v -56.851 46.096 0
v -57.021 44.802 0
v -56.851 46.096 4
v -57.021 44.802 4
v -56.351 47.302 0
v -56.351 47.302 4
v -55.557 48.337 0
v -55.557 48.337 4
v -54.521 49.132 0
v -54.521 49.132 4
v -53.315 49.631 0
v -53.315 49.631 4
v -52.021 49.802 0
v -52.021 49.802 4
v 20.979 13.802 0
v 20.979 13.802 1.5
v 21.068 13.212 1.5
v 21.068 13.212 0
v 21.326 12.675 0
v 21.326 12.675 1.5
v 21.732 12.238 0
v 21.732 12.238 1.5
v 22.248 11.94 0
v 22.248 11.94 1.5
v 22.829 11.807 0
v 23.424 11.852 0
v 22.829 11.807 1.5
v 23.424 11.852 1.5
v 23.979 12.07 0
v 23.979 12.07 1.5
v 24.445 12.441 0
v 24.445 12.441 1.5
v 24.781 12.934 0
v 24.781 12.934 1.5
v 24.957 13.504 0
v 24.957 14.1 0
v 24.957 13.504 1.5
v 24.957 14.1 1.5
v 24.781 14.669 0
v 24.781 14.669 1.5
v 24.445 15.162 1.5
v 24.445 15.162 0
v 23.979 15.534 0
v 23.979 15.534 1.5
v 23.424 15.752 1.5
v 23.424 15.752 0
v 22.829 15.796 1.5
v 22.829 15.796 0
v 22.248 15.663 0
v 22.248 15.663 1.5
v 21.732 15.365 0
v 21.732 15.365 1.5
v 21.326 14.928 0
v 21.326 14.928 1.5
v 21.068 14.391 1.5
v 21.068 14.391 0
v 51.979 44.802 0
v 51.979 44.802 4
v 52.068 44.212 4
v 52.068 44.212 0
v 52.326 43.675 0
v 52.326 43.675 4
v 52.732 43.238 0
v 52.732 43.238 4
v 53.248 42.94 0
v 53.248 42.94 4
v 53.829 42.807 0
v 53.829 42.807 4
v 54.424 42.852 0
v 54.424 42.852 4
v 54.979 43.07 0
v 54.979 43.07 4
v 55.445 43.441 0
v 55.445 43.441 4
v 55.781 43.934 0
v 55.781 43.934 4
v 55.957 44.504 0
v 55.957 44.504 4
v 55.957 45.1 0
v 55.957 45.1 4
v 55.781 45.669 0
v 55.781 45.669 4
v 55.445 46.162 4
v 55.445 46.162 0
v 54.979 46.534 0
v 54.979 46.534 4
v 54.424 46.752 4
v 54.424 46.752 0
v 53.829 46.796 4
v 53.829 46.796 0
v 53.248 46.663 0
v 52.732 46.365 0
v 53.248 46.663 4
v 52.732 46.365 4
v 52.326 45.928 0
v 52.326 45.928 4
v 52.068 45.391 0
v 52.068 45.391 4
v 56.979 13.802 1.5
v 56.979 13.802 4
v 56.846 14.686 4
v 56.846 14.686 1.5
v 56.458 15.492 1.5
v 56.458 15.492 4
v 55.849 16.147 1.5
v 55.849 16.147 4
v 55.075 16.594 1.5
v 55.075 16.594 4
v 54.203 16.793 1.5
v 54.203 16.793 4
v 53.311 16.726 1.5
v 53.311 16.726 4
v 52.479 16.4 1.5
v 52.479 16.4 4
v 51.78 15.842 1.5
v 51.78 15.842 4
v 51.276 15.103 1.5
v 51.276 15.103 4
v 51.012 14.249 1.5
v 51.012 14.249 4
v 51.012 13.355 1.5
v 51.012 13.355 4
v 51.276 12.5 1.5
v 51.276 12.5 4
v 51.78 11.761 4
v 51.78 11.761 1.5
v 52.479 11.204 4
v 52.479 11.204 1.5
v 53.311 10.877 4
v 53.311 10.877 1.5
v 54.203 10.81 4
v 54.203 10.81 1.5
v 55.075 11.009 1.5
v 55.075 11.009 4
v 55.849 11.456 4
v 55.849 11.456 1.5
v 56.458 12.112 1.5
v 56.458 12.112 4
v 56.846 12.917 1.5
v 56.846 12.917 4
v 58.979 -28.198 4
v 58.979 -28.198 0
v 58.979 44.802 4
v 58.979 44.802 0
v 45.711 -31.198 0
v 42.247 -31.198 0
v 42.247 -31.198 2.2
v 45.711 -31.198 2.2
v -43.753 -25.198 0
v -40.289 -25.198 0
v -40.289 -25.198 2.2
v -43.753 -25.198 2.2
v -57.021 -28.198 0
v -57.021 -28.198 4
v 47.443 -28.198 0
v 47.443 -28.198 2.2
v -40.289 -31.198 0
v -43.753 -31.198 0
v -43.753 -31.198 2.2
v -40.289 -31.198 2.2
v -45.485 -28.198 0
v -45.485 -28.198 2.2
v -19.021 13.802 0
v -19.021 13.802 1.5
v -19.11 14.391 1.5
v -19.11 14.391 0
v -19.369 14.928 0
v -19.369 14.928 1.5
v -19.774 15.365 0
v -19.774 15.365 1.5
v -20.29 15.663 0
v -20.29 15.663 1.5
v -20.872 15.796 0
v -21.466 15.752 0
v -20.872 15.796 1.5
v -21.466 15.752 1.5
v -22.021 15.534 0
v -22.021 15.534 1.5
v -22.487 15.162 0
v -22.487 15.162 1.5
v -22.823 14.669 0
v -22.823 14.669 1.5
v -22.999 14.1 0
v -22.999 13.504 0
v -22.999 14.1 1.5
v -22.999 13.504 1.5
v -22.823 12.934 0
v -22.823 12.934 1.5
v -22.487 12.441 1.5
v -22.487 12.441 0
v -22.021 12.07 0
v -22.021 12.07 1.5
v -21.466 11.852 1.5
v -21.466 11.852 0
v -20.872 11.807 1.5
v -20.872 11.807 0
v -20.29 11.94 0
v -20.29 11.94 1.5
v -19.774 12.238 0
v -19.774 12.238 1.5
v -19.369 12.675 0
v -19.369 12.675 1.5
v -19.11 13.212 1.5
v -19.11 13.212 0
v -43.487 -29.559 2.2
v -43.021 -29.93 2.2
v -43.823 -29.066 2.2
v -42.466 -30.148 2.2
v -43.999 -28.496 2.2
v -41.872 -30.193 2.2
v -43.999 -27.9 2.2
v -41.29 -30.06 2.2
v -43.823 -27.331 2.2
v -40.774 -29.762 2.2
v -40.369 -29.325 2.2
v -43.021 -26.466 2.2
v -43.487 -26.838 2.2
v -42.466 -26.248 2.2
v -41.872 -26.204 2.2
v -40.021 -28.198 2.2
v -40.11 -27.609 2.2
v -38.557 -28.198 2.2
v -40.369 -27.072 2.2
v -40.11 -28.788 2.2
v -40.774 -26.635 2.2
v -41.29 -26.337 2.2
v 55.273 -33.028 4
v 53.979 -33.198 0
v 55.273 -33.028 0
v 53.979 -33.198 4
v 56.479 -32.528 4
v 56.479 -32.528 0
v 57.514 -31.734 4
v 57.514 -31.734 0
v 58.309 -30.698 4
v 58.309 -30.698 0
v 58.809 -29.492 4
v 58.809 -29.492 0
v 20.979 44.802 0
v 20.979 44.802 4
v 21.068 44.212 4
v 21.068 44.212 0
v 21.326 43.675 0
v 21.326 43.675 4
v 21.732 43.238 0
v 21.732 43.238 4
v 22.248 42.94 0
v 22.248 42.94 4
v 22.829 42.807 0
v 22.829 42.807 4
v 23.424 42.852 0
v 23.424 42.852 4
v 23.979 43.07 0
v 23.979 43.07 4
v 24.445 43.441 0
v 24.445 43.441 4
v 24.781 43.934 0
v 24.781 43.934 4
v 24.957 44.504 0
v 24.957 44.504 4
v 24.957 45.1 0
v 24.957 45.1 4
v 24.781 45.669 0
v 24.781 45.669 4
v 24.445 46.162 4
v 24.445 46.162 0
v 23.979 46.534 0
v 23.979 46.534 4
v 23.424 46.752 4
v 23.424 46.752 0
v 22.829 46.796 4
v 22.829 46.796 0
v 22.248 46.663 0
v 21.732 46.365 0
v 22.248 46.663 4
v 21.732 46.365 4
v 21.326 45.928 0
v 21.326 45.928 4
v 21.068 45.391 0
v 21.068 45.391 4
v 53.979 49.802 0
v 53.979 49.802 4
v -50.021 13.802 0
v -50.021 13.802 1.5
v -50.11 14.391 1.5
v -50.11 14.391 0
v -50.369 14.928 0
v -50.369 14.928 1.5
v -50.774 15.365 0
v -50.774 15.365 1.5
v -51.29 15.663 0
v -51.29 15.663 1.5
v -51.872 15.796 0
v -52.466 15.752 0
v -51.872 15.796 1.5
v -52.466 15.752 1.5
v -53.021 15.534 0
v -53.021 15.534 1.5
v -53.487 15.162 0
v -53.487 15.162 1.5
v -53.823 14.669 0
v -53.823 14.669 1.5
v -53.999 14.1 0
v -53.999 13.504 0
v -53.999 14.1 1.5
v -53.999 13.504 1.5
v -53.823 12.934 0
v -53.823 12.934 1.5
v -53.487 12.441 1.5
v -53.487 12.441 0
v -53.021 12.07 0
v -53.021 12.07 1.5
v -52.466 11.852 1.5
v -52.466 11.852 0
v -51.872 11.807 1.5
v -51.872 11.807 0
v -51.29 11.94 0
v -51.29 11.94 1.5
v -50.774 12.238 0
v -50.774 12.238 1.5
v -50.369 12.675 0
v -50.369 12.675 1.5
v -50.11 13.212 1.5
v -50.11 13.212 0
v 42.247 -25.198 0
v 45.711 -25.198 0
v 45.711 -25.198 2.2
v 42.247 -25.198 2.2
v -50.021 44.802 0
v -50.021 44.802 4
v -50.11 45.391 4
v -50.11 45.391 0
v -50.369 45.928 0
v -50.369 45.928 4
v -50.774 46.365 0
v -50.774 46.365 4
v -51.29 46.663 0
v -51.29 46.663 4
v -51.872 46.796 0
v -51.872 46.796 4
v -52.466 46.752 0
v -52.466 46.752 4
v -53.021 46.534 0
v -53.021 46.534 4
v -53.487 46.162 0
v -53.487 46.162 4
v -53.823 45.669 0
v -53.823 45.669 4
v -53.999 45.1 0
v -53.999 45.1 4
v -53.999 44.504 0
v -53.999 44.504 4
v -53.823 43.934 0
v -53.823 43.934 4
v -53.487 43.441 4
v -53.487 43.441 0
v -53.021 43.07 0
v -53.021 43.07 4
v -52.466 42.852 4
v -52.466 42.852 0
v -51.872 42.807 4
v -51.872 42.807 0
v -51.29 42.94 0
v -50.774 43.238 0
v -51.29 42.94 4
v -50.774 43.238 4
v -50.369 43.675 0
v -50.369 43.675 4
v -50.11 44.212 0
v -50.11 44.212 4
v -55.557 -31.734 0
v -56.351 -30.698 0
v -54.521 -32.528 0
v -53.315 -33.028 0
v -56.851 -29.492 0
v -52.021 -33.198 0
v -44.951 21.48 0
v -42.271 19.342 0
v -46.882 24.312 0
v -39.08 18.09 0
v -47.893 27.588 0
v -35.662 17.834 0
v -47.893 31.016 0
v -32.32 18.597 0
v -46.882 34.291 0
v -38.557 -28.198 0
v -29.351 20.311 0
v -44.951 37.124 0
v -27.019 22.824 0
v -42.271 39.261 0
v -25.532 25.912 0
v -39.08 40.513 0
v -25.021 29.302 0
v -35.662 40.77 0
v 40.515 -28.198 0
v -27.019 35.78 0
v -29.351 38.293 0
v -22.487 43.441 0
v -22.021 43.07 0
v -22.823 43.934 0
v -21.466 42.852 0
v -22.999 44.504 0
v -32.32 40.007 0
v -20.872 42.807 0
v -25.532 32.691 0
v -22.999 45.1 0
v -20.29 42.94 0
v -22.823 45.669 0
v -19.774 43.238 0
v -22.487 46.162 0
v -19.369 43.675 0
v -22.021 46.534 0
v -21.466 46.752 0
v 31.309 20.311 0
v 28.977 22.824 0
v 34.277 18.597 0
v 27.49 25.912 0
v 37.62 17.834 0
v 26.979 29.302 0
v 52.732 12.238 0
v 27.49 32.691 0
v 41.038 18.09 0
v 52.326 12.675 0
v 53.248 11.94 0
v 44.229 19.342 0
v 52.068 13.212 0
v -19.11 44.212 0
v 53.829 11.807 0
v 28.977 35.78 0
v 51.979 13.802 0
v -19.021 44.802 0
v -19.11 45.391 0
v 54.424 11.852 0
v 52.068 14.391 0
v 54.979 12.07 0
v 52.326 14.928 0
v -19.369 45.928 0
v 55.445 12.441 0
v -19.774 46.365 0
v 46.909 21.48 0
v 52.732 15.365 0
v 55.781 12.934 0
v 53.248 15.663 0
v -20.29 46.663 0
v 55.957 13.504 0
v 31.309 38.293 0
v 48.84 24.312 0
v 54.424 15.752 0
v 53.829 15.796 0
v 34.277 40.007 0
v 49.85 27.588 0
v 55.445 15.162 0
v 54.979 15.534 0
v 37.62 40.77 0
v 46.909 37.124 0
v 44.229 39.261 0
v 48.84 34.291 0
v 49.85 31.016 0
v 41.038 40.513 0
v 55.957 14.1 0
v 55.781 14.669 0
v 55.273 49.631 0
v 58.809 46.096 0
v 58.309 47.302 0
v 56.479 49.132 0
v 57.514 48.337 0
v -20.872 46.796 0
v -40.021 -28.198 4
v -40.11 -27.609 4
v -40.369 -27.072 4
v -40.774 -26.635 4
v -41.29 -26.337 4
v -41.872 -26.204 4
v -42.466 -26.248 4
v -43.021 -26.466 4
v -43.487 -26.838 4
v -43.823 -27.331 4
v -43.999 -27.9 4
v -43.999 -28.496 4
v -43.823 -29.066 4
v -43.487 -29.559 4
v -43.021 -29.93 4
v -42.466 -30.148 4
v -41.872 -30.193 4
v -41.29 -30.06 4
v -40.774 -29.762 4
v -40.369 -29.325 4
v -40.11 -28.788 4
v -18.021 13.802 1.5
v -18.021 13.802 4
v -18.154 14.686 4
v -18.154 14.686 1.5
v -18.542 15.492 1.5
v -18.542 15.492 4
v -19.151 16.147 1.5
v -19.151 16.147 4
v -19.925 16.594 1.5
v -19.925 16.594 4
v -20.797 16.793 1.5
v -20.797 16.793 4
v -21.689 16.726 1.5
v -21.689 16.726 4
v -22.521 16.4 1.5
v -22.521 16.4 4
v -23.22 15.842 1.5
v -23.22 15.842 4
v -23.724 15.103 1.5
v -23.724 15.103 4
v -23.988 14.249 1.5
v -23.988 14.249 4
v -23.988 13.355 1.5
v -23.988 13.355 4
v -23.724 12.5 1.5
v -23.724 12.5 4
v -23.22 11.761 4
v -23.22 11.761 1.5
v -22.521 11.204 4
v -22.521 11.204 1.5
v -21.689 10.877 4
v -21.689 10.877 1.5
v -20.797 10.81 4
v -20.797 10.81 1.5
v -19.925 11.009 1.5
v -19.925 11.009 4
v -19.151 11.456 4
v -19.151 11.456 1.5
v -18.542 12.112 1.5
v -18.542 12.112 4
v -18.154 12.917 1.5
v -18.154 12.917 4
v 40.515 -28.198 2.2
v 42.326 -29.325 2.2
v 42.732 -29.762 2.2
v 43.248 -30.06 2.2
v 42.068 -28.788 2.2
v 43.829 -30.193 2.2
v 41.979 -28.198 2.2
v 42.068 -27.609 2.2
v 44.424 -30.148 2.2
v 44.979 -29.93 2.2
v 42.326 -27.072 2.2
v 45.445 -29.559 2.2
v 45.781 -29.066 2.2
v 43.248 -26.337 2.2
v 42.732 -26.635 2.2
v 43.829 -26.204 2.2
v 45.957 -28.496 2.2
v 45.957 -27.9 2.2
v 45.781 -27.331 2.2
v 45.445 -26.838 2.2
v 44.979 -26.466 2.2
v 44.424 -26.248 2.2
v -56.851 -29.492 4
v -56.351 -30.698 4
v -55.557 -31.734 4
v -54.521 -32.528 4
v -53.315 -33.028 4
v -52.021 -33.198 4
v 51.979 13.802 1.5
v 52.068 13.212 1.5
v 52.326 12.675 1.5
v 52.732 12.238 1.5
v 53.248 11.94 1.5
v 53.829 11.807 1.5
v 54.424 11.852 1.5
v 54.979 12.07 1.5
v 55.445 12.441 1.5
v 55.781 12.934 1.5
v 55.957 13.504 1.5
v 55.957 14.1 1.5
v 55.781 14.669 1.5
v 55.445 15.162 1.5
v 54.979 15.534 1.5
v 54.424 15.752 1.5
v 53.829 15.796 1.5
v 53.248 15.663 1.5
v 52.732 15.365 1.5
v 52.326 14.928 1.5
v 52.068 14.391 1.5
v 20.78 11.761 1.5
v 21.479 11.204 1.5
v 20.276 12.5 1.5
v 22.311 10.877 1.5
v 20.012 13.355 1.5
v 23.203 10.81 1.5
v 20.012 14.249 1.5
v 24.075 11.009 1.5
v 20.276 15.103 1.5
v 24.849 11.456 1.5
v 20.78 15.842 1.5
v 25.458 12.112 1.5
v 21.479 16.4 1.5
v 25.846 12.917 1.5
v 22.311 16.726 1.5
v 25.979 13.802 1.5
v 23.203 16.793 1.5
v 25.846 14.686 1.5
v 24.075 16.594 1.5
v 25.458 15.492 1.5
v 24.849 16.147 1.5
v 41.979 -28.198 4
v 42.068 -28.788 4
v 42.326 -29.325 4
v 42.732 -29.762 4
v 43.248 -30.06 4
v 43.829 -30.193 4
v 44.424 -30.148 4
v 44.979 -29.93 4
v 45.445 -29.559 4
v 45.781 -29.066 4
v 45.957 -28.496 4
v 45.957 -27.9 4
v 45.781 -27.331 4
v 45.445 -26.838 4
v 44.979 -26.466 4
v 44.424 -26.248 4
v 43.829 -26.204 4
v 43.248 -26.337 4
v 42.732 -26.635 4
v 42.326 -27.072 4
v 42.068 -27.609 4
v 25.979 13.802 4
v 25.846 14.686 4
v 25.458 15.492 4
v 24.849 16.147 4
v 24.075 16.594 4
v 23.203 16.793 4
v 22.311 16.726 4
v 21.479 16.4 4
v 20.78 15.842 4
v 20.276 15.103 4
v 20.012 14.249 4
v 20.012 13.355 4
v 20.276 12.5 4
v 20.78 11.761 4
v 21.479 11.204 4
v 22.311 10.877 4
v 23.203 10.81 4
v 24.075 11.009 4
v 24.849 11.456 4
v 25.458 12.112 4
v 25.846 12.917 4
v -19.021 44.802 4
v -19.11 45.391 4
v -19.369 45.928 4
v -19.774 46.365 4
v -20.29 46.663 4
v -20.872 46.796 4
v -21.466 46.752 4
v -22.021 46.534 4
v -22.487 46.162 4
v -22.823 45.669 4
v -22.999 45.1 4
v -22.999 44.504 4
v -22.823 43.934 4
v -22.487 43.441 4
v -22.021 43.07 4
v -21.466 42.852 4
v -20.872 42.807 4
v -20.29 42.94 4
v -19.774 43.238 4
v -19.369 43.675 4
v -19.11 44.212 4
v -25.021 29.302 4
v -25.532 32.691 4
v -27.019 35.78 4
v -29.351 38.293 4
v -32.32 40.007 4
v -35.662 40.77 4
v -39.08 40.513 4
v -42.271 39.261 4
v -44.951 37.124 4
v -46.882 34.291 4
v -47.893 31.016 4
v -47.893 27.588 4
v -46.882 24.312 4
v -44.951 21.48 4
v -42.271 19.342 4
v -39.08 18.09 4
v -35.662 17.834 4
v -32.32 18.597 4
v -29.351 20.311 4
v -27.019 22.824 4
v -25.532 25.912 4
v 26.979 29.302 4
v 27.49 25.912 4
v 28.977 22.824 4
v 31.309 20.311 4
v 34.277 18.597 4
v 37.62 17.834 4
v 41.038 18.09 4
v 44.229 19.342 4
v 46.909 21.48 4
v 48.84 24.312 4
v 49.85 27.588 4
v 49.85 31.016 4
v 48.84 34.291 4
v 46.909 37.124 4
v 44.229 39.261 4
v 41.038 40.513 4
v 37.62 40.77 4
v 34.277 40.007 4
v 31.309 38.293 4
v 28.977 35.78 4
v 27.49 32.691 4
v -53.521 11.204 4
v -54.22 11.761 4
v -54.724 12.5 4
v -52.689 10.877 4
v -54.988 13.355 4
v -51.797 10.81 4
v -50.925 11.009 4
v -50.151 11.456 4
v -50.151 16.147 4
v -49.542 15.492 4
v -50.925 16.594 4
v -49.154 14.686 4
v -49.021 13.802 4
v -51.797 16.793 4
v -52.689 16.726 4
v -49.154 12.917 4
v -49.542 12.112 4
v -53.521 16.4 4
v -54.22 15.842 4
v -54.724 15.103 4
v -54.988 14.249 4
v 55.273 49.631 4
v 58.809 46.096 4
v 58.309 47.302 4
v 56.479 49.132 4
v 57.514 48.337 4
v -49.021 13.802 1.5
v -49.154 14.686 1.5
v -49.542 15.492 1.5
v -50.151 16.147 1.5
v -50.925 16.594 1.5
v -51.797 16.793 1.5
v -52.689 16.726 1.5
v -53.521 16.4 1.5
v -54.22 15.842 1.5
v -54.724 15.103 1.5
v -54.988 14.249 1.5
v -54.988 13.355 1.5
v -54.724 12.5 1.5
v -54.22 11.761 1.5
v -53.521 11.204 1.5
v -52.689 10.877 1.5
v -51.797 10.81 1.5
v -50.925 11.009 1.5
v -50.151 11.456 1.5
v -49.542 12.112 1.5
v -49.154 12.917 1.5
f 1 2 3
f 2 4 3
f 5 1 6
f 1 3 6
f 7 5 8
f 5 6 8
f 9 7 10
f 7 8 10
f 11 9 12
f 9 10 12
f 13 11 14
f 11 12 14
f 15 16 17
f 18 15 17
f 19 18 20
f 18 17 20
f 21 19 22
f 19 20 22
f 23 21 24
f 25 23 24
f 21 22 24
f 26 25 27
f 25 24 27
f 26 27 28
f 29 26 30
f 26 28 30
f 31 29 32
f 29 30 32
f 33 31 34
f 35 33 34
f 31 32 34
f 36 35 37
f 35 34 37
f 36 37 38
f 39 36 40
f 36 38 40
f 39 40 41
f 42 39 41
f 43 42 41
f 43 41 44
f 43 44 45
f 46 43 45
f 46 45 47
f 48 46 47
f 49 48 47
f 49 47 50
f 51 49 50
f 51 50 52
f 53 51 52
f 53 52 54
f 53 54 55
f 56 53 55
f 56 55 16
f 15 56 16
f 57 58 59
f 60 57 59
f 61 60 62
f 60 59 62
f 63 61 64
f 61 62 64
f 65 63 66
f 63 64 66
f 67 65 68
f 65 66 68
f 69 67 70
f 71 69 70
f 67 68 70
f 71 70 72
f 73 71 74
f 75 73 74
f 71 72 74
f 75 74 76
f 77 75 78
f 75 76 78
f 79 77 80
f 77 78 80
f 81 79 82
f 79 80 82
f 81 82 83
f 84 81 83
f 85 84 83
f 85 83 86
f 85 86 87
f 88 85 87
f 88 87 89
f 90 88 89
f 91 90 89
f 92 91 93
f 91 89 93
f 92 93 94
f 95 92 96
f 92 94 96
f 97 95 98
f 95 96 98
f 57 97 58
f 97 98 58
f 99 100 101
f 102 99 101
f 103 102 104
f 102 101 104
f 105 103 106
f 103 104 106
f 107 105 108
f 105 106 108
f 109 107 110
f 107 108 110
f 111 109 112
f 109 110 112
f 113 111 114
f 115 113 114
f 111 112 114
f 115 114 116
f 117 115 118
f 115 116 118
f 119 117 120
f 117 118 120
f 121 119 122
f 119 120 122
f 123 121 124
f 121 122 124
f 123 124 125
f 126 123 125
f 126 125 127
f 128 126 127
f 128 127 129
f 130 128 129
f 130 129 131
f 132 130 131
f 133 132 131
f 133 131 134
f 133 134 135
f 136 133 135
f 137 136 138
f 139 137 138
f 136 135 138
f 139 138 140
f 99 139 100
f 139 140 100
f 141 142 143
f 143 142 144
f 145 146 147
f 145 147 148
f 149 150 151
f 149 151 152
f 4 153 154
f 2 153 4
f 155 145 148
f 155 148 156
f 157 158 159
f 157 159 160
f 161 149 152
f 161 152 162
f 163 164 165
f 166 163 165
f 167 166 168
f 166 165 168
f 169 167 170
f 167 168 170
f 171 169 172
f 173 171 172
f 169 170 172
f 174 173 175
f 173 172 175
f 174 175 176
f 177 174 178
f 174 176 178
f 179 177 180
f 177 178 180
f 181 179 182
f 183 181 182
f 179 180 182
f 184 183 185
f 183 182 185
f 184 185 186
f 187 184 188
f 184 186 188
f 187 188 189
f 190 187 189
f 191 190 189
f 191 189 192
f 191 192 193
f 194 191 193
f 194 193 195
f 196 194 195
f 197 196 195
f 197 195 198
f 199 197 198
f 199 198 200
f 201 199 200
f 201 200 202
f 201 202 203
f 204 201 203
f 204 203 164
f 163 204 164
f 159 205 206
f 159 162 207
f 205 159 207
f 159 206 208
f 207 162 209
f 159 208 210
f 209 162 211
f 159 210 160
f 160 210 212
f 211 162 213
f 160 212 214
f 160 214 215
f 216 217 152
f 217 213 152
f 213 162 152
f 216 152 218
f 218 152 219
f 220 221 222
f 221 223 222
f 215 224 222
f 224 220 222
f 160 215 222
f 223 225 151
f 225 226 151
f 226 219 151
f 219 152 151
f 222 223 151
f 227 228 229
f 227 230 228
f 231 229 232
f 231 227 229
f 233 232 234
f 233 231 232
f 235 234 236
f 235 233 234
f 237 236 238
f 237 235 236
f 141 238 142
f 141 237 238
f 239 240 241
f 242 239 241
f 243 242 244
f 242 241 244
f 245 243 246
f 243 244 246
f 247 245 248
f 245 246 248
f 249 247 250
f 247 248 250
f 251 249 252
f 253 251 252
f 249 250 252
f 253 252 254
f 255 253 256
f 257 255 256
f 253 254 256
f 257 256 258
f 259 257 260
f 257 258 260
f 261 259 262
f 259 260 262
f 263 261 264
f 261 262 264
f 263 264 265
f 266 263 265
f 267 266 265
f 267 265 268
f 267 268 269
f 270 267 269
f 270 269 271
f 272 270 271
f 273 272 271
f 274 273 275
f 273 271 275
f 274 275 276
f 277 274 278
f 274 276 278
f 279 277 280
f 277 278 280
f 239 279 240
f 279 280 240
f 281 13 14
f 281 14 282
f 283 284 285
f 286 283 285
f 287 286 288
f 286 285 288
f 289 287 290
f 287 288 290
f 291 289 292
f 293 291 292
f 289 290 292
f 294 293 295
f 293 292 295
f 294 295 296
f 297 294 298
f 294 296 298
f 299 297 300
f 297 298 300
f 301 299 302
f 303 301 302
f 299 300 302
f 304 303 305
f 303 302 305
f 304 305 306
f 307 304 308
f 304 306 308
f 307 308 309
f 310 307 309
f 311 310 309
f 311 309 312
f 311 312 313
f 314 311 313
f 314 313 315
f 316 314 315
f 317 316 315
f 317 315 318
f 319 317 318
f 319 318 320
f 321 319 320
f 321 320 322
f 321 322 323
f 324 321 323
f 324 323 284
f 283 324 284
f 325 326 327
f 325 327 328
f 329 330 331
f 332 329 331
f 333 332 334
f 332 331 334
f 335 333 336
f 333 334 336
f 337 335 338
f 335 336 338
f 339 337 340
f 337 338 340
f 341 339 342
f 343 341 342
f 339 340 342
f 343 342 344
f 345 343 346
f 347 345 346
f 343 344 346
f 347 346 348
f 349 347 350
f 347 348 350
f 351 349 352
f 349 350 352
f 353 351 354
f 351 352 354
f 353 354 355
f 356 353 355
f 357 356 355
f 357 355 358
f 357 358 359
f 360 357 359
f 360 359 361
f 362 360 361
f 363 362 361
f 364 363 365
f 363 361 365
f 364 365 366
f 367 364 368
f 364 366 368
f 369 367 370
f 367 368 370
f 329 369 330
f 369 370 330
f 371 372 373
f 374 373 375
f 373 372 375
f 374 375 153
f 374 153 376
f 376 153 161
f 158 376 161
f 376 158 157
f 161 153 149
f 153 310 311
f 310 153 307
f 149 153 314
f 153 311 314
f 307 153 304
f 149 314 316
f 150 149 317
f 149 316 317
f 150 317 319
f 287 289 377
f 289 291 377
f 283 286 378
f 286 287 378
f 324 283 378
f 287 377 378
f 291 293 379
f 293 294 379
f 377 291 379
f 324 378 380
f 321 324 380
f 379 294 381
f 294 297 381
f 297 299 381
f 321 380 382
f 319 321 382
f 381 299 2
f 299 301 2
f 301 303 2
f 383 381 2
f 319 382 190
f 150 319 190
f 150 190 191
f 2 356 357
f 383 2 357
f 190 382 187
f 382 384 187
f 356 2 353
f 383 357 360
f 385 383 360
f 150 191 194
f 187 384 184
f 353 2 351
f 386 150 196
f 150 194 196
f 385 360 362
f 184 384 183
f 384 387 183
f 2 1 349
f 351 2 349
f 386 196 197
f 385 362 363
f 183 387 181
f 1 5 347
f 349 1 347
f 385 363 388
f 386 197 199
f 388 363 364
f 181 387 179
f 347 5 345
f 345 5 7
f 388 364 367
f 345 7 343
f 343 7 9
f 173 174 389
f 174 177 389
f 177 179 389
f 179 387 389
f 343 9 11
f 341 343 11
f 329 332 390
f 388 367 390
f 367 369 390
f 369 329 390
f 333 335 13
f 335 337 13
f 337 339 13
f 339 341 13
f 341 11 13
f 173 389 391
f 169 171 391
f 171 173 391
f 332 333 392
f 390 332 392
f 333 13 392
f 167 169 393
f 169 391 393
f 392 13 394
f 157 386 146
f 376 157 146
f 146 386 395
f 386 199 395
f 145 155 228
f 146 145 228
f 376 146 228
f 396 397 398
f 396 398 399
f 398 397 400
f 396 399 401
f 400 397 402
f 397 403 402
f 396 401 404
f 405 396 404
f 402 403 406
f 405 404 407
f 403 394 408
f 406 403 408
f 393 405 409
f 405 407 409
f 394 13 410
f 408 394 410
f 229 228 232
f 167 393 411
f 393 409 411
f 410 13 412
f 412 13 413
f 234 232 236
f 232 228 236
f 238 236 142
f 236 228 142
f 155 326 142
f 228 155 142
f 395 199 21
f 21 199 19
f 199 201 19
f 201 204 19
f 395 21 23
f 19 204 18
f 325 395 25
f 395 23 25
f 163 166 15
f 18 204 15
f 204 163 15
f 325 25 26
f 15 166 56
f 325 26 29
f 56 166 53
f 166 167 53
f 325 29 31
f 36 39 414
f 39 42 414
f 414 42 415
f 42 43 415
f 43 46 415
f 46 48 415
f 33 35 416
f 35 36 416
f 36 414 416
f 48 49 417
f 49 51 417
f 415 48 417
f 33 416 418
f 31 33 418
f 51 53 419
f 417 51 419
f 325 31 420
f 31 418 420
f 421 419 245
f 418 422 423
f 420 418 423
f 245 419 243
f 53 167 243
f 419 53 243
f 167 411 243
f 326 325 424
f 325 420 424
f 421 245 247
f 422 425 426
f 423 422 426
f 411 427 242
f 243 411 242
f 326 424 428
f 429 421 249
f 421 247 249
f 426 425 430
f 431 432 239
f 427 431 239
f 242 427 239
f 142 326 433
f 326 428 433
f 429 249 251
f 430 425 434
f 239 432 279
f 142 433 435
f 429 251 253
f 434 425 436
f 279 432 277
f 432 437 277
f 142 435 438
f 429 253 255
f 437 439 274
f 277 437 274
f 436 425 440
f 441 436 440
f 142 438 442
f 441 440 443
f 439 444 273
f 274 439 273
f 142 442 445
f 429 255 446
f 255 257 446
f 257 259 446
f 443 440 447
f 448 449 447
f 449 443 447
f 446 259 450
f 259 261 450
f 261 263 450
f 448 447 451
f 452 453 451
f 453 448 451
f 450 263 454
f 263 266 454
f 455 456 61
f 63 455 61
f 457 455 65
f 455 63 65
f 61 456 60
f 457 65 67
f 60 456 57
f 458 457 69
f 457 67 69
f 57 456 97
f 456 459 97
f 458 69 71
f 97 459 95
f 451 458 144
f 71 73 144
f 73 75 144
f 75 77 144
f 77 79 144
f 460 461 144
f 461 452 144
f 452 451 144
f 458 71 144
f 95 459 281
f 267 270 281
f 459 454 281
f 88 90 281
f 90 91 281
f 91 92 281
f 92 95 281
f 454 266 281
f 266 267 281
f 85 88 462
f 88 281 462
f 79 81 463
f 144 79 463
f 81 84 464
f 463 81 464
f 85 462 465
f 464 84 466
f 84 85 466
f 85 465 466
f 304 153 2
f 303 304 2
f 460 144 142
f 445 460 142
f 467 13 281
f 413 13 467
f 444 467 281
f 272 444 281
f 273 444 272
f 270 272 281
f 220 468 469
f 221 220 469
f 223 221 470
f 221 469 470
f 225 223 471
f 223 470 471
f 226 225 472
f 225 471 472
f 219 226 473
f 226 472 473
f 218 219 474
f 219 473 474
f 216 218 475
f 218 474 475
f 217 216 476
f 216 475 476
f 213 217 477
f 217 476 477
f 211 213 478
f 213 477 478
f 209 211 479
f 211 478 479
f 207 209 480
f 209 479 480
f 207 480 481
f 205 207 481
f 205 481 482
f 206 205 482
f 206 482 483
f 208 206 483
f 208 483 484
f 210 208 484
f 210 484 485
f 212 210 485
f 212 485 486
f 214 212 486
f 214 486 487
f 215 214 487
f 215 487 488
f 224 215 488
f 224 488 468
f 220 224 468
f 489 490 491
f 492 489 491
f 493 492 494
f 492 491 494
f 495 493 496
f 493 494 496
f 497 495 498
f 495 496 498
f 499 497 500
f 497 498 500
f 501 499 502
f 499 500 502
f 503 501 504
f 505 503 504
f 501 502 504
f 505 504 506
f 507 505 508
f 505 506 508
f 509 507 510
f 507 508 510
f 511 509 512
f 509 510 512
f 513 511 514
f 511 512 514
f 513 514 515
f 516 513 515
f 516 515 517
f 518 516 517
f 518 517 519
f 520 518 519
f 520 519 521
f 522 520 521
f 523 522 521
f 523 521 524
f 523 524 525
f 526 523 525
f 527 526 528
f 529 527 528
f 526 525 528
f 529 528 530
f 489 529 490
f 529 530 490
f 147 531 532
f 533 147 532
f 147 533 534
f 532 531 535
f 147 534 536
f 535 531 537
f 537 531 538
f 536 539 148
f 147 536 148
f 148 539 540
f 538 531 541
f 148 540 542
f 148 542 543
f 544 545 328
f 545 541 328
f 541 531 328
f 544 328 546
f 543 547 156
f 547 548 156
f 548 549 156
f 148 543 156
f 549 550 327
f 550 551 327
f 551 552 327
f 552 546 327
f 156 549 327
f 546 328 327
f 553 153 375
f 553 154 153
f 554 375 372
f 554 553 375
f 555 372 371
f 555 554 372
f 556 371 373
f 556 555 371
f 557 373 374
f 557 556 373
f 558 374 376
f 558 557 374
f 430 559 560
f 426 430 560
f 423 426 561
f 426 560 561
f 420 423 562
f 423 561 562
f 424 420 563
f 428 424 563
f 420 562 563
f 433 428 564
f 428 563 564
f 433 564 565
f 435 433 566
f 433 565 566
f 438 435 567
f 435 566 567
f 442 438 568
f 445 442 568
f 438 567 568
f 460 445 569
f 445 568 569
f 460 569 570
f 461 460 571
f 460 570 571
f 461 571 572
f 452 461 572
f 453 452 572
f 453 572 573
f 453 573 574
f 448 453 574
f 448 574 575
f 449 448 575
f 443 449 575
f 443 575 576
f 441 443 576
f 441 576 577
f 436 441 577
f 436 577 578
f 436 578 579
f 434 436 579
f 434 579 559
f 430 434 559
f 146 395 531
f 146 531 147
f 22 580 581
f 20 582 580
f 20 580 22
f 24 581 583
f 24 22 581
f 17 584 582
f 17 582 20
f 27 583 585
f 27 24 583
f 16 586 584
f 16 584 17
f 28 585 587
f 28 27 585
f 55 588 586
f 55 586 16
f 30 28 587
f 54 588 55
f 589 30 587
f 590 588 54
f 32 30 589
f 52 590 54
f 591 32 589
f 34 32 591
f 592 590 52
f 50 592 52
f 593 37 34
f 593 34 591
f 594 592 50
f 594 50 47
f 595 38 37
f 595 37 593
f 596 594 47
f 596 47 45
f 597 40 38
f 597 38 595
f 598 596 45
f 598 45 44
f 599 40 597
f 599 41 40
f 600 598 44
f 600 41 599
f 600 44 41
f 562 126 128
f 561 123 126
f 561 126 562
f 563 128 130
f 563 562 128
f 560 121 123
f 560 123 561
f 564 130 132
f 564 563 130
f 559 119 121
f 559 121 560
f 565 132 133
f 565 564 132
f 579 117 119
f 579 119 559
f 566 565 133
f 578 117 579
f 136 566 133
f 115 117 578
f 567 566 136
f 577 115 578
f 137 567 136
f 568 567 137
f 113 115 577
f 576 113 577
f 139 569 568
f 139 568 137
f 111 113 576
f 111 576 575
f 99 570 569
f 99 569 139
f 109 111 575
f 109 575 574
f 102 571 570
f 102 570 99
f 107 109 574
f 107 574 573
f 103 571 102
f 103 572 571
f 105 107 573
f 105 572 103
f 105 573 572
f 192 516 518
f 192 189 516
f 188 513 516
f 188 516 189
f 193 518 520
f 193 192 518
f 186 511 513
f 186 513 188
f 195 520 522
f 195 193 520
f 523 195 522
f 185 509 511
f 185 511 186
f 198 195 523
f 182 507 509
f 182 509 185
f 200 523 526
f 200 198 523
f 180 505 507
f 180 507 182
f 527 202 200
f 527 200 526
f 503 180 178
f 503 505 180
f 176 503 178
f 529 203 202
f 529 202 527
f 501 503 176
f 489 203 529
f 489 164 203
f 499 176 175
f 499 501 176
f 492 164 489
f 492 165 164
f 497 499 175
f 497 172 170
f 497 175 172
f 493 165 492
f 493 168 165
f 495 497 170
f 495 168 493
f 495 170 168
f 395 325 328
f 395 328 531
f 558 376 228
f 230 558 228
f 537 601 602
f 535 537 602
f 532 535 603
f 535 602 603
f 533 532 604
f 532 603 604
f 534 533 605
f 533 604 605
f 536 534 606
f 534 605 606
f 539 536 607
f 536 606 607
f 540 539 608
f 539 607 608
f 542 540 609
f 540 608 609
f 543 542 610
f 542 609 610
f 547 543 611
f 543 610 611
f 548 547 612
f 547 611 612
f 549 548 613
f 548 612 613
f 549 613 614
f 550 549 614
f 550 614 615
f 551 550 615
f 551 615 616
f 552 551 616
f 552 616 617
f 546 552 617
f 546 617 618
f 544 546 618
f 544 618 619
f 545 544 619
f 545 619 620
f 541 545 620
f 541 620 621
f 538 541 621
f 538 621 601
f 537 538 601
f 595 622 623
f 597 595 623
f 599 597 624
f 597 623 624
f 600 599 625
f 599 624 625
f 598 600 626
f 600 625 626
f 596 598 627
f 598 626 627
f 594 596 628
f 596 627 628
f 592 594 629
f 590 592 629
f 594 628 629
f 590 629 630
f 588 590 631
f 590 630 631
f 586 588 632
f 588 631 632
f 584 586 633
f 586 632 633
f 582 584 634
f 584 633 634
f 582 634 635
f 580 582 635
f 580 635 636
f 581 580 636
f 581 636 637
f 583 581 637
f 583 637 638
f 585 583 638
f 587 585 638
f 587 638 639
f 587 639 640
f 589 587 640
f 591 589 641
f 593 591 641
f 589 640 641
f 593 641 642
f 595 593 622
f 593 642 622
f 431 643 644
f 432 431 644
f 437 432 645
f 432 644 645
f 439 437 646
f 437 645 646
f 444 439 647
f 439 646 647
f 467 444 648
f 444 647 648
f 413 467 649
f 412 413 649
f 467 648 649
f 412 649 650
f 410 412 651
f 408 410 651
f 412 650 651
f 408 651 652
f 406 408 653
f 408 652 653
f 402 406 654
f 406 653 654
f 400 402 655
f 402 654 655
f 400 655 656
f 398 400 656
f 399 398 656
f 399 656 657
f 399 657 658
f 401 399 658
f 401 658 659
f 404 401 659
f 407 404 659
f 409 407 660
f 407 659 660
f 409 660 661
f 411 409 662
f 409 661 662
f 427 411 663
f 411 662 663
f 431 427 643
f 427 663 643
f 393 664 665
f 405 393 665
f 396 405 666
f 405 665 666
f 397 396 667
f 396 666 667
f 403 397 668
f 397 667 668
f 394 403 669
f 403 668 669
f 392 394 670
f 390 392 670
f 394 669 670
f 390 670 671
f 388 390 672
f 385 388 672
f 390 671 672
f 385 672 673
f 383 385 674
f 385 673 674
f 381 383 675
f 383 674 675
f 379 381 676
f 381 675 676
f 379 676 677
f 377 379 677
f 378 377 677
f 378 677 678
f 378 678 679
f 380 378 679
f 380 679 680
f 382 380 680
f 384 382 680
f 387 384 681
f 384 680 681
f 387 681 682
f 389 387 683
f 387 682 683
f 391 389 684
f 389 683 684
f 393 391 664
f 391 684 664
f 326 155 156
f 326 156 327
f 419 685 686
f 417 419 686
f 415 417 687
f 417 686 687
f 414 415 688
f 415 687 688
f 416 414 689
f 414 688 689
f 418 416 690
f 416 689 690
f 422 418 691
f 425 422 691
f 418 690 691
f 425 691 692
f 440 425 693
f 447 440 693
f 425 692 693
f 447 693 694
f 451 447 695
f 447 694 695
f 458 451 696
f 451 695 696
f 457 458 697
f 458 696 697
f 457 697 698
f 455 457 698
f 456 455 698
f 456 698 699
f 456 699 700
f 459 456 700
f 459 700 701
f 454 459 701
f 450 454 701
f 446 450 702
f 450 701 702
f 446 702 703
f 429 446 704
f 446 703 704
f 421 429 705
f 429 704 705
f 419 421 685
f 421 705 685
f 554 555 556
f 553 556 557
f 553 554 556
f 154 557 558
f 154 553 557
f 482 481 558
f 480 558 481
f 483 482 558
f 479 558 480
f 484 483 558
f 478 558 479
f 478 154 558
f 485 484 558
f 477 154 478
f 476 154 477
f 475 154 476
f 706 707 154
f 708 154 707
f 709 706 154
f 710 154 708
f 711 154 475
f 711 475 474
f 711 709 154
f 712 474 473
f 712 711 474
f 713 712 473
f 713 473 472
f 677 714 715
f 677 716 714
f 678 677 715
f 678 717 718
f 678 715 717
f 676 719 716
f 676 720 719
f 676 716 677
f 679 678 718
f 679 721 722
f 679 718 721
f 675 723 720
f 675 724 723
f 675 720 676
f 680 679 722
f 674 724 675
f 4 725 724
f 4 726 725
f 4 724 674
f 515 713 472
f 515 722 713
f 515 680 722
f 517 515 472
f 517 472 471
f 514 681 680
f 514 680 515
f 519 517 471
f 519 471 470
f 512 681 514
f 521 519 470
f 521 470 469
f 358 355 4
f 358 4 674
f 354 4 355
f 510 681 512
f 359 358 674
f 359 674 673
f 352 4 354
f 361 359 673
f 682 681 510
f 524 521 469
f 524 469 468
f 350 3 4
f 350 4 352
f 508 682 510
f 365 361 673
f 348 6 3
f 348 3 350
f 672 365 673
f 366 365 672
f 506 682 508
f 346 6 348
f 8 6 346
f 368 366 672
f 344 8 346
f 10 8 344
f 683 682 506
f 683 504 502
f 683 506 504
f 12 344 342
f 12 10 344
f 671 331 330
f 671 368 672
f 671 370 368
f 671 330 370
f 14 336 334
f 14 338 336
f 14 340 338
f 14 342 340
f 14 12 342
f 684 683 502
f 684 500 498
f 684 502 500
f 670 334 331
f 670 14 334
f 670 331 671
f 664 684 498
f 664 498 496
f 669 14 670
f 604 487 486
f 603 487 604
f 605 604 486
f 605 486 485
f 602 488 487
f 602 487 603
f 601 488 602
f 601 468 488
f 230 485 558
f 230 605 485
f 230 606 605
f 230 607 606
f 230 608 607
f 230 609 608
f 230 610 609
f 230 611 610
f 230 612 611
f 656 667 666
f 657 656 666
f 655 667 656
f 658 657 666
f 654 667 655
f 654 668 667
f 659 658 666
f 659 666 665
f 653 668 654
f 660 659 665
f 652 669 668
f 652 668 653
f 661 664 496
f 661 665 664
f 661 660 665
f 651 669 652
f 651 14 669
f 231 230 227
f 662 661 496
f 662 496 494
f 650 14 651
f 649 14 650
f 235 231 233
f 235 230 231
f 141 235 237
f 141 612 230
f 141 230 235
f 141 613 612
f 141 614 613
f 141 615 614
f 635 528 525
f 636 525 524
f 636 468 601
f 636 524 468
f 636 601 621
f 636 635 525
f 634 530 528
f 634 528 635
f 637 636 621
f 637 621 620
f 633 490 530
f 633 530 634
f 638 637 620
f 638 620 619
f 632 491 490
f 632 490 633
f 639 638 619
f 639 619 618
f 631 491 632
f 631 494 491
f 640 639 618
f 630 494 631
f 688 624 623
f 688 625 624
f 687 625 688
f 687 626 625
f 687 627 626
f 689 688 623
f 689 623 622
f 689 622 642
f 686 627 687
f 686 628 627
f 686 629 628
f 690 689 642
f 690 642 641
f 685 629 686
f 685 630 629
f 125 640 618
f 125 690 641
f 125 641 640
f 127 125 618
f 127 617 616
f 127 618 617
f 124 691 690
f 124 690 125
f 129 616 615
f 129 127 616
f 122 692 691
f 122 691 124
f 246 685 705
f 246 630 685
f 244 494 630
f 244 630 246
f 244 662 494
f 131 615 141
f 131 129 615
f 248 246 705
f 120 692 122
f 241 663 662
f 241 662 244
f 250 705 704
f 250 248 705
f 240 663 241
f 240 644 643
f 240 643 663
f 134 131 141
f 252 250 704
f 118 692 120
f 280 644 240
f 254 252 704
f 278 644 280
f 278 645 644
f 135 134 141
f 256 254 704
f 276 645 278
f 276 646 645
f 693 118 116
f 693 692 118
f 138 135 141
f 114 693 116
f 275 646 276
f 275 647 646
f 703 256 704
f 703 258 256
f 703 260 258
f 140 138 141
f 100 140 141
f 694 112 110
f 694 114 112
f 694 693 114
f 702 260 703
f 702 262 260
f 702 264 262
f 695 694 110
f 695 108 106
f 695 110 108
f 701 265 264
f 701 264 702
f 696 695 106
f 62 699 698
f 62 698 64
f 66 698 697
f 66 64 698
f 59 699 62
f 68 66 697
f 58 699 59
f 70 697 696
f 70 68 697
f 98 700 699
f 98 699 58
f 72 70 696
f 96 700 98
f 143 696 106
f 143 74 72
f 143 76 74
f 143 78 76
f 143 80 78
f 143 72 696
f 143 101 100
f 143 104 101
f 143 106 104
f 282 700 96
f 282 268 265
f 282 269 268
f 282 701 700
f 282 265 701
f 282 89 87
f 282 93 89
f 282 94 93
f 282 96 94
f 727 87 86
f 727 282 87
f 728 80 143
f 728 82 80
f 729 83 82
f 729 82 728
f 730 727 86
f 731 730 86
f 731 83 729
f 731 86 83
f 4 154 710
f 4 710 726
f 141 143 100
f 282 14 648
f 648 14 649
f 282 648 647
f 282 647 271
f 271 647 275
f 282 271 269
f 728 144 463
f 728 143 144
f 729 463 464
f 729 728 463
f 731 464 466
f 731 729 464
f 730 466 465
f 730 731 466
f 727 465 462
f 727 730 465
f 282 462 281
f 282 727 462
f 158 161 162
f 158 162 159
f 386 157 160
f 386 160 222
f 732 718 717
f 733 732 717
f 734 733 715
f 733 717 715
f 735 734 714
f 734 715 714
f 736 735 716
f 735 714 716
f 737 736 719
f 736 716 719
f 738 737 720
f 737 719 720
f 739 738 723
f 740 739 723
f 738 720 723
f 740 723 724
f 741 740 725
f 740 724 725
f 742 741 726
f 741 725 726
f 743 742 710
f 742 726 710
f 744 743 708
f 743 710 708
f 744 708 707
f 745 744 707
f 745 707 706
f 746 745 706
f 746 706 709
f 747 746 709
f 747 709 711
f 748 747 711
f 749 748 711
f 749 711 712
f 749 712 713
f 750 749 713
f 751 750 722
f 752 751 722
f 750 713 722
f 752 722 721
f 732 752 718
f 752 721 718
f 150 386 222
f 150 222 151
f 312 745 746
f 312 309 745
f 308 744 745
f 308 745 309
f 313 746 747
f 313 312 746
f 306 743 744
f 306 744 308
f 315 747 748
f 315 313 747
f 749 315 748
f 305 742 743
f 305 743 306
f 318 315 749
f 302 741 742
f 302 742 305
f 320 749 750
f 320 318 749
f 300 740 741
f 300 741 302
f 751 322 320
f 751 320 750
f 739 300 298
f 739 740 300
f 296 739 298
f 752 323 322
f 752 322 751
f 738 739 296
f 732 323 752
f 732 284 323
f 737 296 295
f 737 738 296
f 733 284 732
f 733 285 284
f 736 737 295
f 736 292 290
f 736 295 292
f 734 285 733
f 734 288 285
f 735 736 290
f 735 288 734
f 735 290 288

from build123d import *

# Parameters (mm, degrees)
ESQUISSE1_W             = 116
ESQUISSE1_H             = 83
BOSS_EXTRU_1_DEPTH      = 4
CONG_1_R                = 5
ESQUISSE2_R             = 2
ESQUISSE2_R_2           = 11.5
ENL_V_MAT_EXTRU_1_DEPTH = 4
ESQUISSE3_R             = 3
ENL_V_MAT_EXTRU_2_DEPTH = 2.5
ENL_V_START             = -4
ENL_V_MAT_EXTRU_3_DEPTH = 2.2


with BuildPart() as part:
    # Esquisse1 → Boss.-Extru.1 (new body)
    with BuildSketch(Plane.XY):
        with Locations((0.978902954, 8.301687764)):
            Rectangle(ESQUISSE1_W, ESQUISSE1_H)
    extrude(amount=BOSS_EXTRU_1_DEPTH)

    # Congé1
    cong_1_edges = [part.edges().sort_by_distance(p)[0] for p in [
        (-57.021097046, 49.801687764, 2),
        (58.978902954, 49.801687764, 2),
        (58.978902954, -33.198312236, 2),
        (-57.021097046, -33.198312236, 2),
    ]]
    fillet(cong_1_edges, radius=CONG_1_R)

    # Esquisse2 → Enlèv. mat.-Extru.1 (cut)
    with BuildSketch(Plane.XY.offset(4)):
        with Locations((-42.021097046, -28.198312236)):
            Circle(ESQUISSE2_R)
        with Locations((-52.021097046, 44.801687764)):
            Circle(ESQUISSE2_R)
        with Locations((-21.021097046, 44.801687764)):
            Circle(ESQUISSE2_R)
        with Locations((-36.521097046, 29.301687764)):
            Circle(ESQUISSE2_R_2)
        with Locations((-21.021097046, 13.801687764)):
            Circle(ESQUISSE2_R)
        with Locations((-52.021097046, 13.801687764)):
            Circle(ESQUISSE2_R)
        with Locations(Location((43.978902954, -28.198312236, 0), (0, 0, 180))):
            Circle(ESQUISSE2_R)
        with Locations(Location((38.478902954, 29.301687764, 0), (0, 0, 180))):
            Circle(ESQUISSE2_R_2)
        with Locations(Location((22.978902954, 13.801687764, 0), (0, 0, 180))):
            Circle(ESQUISSE2_R)
        with Locations(Location((22.978902954, 44.801687764, 0), (0, 0, 180))):
            Circle(ESQUISSE2_R)
        with Locations(Location((53.978902954, 44.801687764, 0), (0, 0, 180))):
            Circle(ESQUISSE2_R)
        with Locations(Location((53.978902954, 13.801687764, 0), (0, 0, 180))):
            Circle(ESQUISSE2_R)
    extrude(amount=-ENL_V_MAT_EXTRU_1_DEPTH, mode=Mode.SUBTRACT)

    # Esquisse3 → Enlèv. mat.-Extru.2 (cut)
    with BuildSketch(Plane.XY.offset(4)):
        with Locations((-52.021097046, 13.801687764)):
            Circle(ESQUISSE3_R)
        with Locations((-21.021097046, 13.801687764)):
            Circle(ESQUISSE3_R)
        with Locations((22.978902954, 13.801687764)):
            Circle(ESQUISSE3_R)
        with Locations((53.978902954, 13.801687764)):
            Circle(ESQUISSE3_R)
    extrude(amount=-ENL_V_MAT_EXTRU_2_DEPTH, mode=Mode.SUBTRACT)

    # Esquisse4 → Enlèv. mat.-Extru.3 (cut)
    with BuildSketch(Plane.XY.offset(4).offset(ENL_V_START)):
        Polygon((-43.753147854, -25.198312236), (-45.485198662, -28.198312236), (-43.753147854, -31.198312236), (-40.289046239, -31.198312236), (-38.556995431, -28.198312236), (-40.289046239, -25.198312236), align=None)
        Polygon((42.246852146, -25.198312236), (40.514801338, -28.198312236), (42.246852146, -31.198312236), (45.710953761, -31.198312236), (47.443004569, -28.198312236), (45.710953761, -25.198312236), align=None)
    extrude(amount=ENL_V_MAT_EXTRU_3_DEPTH, mode=Mode.SUBTRACT)


solid = part.part
